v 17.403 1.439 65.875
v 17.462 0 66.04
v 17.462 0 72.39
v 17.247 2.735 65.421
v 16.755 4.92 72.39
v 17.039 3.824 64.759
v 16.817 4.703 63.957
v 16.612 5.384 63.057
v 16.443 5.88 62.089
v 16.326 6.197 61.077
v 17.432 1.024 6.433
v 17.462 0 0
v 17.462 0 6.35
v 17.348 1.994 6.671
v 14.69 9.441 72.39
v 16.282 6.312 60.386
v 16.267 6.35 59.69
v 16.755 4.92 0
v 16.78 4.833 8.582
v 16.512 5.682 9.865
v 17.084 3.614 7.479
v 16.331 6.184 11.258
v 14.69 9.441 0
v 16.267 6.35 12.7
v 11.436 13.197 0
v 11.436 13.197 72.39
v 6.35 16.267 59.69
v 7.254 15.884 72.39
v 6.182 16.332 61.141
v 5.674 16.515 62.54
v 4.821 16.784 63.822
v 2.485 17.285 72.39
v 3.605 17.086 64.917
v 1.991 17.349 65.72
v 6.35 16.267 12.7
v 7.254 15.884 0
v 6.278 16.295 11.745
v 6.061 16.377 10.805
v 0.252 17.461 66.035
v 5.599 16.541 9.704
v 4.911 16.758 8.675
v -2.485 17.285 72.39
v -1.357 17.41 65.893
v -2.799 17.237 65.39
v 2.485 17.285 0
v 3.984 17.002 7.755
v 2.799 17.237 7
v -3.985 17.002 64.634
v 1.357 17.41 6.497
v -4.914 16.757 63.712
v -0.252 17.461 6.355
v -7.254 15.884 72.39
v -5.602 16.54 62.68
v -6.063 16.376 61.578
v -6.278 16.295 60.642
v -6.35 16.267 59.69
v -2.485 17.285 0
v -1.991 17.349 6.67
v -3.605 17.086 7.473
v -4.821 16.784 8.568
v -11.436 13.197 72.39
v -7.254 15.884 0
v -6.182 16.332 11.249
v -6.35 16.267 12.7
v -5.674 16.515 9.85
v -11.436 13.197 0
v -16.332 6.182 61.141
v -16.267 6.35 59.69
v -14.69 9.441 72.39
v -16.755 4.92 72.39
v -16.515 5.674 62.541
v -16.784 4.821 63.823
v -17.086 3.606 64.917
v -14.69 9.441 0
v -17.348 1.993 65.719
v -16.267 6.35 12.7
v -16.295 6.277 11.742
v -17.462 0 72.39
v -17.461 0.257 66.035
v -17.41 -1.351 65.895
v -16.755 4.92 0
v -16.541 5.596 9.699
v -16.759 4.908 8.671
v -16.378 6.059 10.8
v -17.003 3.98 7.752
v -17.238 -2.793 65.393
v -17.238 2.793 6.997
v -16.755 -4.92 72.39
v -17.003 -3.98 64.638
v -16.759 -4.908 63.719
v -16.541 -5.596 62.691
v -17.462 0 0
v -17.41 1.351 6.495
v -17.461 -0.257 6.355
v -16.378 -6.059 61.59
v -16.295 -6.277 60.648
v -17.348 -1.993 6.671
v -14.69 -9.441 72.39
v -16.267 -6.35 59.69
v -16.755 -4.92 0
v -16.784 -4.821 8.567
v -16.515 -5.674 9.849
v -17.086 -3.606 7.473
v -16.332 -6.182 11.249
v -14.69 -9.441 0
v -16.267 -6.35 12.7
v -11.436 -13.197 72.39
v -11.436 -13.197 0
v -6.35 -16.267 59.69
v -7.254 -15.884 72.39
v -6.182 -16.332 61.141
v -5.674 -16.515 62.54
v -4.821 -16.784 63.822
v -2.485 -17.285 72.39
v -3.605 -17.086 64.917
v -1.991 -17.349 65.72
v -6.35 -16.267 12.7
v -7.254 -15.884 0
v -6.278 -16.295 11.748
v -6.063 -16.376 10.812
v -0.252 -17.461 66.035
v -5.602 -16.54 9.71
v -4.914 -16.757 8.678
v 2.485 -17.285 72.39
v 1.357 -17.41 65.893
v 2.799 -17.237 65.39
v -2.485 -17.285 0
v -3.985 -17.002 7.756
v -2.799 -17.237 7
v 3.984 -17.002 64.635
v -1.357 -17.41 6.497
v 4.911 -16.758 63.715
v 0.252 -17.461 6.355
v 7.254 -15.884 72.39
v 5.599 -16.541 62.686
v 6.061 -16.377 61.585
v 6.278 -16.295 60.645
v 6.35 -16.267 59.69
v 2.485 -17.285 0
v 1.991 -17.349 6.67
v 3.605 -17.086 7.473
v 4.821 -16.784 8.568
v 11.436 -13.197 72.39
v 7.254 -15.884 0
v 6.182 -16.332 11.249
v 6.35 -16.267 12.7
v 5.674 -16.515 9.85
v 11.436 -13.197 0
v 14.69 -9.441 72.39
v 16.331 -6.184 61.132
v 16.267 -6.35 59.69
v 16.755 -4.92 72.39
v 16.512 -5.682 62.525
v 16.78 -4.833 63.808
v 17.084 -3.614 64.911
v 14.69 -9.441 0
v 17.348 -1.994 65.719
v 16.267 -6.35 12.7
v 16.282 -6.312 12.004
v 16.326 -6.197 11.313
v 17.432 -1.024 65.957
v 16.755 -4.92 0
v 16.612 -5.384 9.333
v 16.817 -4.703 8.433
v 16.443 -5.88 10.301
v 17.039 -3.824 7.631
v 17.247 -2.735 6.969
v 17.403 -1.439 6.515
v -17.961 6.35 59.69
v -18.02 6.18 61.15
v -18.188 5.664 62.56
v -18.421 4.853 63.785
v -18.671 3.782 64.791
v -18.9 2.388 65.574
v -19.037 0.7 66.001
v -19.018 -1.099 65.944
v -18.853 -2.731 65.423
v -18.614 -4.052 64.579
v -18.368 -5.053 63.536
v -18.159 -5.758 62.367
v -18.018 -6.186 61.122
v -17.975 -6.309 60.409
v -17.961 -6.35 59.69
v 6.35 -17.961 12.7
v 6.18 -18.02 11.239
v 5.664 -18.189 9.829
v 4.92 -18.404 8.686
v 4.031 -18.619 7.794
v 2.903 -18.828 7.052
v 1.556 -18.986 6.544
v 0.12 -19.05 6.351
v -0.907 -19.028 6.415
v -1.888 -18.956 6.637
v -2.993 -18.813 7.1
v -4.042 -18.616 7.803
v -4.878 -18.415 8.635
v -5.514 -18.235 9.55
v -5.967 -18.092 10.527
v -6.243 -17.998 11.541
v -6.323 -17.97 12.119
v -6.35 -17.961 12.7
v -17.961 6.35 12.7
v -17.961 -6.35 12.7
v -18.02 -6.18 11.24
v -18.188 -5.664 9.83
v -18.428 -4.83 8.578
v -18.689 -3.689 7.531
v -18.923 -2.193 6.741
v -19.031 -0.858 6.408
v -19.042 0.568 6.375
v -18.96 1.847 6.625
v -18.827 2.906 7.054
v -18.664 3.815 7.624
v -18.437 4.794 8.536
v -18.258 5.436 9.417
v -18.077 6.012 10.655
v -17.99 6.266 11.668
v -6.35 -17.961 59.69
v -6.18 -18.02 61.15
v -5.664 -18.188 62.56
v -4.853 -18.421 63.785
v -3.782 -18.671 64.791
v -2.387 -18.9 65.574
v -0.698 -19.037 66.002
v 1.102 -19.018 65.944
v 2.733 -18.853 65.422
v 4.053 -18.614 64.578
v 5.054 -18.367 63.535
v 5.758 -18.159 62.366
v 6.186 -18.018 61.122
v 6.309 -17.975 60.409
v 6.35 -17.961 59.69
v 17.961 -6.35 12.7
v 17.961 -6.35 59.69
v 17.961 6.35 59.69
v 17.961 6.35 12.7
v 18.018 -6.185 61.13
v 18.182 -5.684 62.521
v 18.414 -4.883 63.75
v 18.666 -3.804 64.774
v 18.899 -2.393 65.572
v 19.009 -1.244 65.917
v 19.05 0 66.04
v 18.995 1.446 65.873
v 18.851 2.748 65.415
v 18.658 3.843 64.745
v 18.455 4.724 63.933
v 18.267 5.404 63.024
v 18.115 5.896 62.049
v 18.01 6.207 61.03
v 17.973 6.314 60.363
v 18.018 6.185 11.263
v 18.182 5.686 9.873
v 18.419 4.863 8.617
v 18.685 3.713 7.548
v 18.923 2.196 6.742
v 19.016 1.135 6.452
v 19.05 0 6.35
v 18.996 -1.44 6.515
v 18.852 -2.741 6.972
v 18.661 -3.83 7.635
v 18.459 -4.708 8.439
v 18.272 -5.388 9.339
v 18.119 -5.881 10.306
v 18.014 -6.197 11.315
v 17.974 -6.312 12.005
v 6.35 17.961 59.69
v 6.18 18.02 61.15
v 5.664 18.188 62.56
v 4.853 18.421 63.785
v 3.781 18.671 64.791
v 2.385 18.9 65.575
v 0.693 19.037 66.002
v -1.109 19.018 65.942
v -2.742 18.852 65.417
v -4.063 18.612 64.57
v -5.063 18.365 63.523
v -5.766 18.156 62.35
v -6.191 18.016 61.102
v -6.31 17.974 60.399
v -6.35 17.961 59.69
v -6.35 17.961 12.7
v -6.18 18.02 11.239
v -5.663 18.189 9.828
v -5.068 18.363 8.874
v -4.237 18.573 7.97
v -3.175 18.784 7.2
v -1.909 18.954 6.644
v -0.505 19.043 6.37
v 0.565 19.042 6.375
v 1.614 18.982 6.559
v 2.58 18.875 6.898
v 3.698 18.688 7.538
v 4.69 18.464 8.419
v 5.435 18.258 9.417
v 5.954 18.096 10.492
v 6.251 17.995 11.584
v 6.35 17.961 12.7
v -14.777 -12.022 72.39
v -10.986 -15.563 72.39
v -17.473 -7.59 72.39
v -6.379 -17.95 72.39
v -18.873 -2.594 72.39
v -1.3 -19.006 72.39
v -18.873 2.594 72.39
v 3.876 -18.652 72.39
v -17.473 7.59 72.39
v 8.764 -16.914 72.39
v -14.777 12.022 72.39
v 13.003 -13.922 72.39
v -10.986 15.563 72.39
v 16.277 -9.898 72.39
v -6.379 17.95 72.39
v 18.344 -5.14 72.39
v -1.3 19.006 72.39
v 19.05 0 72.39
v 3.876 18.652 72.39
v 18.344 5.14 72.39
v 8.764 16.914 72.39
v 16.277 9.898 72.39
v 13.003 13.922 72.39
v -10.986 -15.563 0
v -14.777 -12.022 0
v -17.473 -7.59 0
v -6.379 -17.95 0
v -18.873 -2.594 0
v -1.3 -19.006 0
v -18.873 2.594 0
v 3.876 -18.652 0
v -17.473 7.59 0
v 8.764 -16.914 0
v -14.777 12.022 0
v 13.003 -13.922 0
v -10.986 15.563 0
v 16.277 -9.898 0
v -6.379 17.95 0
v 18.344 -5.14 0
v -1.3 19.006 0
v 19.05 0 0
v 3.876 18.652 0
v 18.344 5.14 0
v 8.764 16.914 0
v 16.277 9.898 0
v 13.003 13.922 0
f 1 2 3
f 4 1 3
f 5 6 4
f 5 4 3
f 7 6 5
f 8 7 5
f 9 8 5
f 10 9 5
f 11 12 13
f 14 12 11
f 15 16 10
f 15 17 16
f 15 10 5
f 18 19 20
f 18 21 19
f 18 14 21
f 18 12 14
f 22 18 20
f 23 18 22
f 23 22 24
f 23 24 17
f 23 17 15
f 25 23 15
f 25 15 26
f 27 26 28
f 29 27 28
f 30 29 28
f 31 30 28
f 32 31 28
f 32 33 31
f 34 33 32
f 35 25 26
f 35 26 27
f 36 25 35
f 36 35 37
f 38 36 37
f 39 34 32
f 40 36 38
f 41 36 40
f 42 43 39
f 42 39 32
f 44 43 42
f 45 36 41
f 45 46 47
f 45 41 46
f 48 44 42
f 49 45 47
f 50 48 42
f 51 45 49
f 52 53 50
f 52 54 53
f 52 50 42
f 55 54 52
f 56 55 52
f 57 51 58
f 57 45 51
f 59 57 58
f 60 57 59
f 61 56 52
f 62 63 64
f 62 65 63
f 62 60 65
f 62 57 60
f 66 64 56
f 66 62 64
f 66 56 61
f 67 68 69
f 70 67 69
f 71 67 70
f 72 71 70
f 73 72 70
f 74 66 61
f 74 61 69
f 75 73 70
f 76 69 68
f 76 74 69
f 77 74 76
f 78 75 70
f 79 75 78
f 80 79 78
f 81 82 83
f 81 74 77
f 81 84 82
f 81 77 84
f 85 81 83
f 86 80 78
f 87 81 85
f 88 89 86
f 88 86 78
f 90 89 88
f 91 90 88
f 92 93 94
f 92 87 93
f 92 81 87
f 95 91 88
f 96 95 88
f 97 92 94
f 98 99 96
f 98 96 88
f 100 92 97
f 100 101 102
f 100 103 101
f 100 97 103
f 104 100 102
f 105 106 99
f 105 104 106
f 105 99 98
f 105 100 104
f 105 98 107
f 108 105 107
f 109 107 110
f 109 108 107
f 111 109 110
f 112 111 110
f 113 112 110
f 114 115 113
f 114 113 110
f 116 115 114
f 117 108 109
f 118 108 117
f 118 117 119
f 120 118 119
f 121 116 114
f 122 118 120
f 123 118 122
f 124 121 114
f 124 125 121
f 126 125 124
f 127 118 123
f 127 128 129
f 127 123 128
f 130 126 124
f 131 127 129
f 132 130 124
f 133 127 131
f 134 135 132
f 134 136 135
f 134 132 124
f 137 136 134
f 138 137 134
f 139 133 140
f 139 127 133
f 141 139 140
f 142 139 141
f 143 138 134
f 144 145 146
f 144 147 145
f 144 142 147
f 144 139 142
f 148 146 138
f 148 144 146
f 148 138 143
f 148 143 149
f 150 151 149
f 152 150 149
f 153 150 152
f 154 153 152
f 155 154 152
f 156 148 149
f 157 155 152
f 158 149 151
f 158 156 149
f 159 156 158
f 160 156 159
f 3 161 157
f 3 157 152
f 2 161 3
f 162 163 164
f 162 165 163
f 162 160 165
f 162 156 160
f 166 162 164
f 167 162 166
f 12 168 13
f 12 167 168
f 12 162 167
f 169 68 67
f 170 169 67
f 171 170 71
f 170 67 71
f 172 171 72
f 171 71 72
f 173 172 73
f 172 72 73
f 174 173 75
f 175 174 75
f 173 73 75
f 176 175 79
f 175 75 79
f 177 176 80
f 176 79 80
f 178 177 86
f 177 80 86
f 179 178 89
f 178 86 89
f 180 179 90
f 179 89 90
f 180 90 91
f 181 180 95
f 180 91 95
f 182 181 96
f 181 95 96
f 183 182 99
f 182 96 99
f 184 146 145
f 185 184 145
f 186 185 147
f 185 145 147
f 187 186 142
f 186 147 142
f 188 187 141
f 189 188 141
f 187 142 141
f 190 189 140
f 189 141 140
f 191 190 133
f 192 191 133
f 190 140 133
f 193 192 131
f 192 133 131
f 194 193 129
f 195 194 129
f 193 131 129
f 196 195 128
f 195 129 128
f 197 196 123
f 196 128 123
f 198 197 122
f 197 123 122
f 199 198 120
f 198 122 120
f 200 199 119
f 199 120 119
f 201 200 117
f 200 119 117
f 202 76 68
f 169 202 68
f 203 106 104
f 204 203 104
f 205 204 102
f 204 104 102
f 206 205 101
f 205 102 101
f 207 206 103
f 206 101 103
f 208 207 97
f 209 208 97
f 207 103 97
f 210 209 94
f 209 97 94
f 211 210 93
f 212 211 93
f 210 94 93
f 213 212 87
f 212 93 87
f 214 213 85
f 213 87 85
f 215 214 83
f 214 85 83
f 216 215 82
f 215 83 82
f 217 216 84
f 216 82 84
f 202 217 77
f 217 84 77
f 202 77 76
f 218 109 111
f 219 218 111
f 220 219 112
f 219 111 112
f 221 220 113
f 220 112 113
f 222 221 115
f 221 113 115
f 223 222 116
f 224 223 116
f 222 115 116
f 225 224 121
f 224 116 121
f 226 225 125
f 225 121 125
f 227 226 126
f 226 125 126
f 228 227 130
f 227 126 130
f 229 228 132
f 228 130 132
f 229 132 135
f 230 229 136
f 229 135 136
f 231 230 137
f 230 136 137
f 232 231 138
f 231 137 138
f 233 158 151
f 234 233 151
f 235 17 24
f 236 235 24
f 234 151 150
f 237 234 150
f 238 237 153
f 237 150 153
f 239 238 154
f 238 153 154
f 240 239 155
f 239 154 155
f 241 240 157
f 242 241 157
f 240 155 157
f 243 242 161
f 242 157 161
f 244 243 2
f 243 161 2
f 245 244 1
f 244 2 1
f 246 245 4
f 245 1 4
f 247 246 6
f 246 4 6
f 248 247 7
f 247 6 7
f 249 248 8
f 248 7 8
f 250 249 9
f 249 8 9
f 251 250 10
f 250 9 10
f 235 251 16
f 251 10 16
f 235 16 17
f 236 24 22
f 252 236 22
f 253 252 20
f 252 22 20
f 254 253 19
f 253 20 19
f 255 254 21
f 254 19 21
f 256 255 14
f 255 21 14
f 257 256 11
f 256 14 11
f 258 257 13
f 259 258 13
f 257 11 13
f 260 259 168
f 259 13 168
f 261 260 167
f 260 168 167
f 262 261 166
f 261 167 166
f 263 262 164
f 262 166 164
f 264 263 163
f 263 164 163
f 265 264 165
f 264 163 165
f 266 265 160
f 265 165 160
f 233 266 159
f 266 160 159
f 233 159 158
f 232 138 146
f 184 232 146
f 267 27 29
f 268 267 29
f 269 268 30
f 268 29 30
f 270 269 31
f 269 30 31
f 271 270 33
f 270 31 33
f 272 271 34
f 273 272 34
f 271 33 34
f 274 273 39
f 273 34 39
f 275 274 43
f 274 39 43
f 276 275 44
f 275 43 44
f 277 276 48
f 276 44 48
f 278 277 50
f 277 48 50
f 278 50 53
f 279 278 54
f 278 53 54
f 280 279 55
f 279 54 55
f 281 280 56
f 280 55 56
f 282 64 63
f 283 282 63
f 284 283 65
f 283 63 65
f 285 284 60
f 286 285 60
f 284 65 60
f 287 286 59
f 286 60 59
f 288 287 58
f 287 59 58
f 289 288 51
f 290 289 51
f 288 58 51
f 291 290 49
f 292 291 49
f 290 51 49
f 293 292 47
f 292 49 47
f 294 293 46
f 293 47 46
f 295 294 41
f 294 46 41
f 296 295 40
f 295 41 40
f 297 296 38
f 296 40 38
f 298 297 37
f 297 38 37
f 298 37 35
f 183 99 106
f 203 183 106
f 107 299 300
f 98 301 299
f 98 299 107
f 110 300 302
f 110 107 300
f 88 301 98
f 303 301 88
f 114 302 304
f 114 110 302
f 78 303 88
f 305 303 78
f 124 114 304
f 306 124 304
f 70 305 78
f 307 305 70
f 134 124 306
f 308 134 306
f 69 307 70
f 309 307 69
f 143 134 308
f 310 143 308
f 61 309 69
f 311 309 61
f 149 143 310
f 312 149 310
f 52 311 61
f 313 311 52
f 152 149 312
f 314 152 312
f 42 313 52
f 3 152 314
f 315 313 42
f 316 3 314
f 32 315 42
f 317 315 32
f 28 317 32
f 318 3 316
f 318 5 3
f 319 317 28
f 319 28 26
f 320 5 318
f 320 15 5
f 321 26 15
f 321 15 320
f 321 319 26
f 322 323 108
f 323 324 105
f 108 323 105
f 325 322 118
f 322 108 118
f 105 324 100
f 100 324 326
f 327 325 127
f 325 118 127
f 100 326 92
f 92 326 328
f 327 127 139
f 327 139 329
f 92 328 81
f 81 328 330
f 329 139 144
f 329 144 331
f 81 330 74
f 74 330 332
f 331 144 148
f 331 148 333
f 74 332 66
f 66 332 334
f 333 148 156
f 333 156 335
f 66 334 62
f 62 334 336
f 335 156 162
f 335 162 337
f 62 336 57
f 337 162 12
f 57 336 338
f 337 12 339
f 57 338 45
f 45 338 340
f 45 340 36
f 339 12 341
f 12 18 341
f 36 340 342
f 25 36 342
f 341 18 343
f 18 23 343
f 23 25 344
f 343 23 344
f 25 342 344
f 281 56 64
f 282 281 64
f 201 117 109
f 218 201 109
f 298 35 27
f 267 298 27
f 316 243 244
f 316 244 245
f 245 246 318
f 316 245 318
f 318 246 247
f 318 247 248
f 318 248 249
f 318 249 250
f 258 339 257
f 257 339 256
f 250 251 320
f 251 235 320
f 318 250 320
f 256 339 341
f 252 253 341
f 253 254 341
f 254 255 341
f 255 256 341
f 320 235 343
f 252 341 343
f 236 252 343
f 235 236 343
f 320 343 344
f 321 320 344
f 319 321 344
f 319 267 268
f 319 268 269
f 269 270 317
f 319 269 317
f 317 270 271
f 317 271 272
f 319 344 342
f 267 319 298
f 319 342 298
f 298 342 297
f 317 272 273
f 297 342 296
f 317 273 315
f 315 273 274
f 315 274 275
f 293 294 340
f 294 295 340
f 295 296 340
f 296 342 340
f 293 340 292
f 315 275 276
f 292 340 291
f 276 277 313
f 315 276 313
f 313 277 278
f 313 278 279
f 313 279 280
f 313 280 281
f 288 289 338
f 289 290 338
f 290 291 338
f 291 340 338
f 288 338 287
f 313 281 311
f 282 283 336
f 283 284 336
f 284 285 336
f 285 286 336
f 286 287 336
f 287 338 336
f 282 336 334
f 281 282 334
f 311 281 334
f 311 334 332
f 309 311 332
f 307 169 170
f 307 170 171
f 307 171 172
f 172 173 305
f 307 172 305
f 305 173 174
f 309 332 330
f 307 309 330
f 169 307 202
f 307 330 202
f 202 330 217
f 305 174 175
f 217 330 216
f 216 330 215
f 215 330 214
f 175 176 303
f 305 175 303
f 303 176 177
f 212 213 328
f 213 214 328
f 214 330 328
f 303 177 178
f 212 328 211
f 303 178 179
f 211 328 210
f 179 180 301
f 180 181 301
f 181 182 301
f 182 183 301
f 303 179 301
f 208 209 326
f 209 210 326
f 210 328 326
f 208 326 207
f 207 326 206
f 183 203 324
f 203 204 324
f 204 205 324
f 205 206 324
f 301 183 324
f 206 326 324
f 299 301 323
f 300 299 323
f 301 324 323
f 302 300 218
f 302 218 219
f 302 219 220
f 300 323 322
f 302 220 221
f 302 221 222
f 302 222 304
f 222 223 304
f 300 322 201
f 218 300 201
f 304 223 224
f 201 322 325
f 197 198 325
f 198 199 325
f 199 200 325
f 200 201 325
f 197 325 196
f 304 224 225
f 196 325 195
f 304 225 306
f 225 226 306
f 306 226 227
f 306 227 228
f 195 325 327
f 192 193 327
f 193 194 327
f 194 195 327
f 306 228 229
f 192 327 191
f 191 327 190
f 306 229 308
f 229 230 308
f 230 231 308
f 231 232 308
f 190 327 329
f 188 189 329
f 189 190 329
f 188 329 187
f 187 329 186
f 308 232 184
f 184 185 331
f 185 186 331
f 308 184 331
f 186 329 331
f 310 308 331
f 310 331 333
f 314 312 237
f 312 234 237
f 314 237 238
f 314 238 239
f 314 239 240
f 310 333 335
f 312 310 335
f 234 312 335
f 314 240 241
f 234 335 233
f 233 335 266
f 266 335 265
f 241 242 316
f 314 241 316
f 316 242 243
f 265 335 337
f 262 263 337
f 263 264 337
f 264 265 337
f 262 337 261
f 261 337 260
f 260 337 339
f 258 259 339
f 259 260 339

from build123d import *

# Parameters (mm, degrees)
F0_R            = 19.05
F0_R_2          = 17.4625
F1_DEPTH        = 72.39
F3_DEPTH        = 25.4
F3_COPIES_COUNT = 4


# Not quite as in the source:
# - a pattern or mirror of a feature is missing from the dataset's text; its kind, count and spacing are read off the source's solid


with BuildPart() as f1:
    # F0 (on Top) → F1 (new body)
    with BuildSketch(Plane.XY):
        Circle(F0_R)
        Circle(F0_R_2, mode=Mode.SUBTRACT)
    extrude(amount=F1_DEPTH)

    # F2 (on Front) → F3 (cut)
    with BuildSketch(Plane.XZ):
        with BuildLine():
            Line((-6.35, 59.69), (-6.35, 12.7))
            ThreePointArc((-6.35, 12.7), (0, 6.35), (6.35, 12.7))
            Line((6.35, 12.7), (6.35, 59.69))
            ThreePointArc((6.35, 59.69), (0, 66.04), (-6.35, 59.69))
        make_face()
    f3 = extrude(amount=-F3_DEPTH, mode=Mode.SUBTRACT)

    # F3_copies: F3 ×4 about axis
    f3_copies_axis = Axis((0, 0, 0), (0, 0, 1))
    for i in range(1, F3_COPIES_COUNT):
        add(f3.rotate(f3_copies_axis, i * 360 / F3_COPIES_COUNT), mode=Mode.SUBTRACT)


solid = f1.part
